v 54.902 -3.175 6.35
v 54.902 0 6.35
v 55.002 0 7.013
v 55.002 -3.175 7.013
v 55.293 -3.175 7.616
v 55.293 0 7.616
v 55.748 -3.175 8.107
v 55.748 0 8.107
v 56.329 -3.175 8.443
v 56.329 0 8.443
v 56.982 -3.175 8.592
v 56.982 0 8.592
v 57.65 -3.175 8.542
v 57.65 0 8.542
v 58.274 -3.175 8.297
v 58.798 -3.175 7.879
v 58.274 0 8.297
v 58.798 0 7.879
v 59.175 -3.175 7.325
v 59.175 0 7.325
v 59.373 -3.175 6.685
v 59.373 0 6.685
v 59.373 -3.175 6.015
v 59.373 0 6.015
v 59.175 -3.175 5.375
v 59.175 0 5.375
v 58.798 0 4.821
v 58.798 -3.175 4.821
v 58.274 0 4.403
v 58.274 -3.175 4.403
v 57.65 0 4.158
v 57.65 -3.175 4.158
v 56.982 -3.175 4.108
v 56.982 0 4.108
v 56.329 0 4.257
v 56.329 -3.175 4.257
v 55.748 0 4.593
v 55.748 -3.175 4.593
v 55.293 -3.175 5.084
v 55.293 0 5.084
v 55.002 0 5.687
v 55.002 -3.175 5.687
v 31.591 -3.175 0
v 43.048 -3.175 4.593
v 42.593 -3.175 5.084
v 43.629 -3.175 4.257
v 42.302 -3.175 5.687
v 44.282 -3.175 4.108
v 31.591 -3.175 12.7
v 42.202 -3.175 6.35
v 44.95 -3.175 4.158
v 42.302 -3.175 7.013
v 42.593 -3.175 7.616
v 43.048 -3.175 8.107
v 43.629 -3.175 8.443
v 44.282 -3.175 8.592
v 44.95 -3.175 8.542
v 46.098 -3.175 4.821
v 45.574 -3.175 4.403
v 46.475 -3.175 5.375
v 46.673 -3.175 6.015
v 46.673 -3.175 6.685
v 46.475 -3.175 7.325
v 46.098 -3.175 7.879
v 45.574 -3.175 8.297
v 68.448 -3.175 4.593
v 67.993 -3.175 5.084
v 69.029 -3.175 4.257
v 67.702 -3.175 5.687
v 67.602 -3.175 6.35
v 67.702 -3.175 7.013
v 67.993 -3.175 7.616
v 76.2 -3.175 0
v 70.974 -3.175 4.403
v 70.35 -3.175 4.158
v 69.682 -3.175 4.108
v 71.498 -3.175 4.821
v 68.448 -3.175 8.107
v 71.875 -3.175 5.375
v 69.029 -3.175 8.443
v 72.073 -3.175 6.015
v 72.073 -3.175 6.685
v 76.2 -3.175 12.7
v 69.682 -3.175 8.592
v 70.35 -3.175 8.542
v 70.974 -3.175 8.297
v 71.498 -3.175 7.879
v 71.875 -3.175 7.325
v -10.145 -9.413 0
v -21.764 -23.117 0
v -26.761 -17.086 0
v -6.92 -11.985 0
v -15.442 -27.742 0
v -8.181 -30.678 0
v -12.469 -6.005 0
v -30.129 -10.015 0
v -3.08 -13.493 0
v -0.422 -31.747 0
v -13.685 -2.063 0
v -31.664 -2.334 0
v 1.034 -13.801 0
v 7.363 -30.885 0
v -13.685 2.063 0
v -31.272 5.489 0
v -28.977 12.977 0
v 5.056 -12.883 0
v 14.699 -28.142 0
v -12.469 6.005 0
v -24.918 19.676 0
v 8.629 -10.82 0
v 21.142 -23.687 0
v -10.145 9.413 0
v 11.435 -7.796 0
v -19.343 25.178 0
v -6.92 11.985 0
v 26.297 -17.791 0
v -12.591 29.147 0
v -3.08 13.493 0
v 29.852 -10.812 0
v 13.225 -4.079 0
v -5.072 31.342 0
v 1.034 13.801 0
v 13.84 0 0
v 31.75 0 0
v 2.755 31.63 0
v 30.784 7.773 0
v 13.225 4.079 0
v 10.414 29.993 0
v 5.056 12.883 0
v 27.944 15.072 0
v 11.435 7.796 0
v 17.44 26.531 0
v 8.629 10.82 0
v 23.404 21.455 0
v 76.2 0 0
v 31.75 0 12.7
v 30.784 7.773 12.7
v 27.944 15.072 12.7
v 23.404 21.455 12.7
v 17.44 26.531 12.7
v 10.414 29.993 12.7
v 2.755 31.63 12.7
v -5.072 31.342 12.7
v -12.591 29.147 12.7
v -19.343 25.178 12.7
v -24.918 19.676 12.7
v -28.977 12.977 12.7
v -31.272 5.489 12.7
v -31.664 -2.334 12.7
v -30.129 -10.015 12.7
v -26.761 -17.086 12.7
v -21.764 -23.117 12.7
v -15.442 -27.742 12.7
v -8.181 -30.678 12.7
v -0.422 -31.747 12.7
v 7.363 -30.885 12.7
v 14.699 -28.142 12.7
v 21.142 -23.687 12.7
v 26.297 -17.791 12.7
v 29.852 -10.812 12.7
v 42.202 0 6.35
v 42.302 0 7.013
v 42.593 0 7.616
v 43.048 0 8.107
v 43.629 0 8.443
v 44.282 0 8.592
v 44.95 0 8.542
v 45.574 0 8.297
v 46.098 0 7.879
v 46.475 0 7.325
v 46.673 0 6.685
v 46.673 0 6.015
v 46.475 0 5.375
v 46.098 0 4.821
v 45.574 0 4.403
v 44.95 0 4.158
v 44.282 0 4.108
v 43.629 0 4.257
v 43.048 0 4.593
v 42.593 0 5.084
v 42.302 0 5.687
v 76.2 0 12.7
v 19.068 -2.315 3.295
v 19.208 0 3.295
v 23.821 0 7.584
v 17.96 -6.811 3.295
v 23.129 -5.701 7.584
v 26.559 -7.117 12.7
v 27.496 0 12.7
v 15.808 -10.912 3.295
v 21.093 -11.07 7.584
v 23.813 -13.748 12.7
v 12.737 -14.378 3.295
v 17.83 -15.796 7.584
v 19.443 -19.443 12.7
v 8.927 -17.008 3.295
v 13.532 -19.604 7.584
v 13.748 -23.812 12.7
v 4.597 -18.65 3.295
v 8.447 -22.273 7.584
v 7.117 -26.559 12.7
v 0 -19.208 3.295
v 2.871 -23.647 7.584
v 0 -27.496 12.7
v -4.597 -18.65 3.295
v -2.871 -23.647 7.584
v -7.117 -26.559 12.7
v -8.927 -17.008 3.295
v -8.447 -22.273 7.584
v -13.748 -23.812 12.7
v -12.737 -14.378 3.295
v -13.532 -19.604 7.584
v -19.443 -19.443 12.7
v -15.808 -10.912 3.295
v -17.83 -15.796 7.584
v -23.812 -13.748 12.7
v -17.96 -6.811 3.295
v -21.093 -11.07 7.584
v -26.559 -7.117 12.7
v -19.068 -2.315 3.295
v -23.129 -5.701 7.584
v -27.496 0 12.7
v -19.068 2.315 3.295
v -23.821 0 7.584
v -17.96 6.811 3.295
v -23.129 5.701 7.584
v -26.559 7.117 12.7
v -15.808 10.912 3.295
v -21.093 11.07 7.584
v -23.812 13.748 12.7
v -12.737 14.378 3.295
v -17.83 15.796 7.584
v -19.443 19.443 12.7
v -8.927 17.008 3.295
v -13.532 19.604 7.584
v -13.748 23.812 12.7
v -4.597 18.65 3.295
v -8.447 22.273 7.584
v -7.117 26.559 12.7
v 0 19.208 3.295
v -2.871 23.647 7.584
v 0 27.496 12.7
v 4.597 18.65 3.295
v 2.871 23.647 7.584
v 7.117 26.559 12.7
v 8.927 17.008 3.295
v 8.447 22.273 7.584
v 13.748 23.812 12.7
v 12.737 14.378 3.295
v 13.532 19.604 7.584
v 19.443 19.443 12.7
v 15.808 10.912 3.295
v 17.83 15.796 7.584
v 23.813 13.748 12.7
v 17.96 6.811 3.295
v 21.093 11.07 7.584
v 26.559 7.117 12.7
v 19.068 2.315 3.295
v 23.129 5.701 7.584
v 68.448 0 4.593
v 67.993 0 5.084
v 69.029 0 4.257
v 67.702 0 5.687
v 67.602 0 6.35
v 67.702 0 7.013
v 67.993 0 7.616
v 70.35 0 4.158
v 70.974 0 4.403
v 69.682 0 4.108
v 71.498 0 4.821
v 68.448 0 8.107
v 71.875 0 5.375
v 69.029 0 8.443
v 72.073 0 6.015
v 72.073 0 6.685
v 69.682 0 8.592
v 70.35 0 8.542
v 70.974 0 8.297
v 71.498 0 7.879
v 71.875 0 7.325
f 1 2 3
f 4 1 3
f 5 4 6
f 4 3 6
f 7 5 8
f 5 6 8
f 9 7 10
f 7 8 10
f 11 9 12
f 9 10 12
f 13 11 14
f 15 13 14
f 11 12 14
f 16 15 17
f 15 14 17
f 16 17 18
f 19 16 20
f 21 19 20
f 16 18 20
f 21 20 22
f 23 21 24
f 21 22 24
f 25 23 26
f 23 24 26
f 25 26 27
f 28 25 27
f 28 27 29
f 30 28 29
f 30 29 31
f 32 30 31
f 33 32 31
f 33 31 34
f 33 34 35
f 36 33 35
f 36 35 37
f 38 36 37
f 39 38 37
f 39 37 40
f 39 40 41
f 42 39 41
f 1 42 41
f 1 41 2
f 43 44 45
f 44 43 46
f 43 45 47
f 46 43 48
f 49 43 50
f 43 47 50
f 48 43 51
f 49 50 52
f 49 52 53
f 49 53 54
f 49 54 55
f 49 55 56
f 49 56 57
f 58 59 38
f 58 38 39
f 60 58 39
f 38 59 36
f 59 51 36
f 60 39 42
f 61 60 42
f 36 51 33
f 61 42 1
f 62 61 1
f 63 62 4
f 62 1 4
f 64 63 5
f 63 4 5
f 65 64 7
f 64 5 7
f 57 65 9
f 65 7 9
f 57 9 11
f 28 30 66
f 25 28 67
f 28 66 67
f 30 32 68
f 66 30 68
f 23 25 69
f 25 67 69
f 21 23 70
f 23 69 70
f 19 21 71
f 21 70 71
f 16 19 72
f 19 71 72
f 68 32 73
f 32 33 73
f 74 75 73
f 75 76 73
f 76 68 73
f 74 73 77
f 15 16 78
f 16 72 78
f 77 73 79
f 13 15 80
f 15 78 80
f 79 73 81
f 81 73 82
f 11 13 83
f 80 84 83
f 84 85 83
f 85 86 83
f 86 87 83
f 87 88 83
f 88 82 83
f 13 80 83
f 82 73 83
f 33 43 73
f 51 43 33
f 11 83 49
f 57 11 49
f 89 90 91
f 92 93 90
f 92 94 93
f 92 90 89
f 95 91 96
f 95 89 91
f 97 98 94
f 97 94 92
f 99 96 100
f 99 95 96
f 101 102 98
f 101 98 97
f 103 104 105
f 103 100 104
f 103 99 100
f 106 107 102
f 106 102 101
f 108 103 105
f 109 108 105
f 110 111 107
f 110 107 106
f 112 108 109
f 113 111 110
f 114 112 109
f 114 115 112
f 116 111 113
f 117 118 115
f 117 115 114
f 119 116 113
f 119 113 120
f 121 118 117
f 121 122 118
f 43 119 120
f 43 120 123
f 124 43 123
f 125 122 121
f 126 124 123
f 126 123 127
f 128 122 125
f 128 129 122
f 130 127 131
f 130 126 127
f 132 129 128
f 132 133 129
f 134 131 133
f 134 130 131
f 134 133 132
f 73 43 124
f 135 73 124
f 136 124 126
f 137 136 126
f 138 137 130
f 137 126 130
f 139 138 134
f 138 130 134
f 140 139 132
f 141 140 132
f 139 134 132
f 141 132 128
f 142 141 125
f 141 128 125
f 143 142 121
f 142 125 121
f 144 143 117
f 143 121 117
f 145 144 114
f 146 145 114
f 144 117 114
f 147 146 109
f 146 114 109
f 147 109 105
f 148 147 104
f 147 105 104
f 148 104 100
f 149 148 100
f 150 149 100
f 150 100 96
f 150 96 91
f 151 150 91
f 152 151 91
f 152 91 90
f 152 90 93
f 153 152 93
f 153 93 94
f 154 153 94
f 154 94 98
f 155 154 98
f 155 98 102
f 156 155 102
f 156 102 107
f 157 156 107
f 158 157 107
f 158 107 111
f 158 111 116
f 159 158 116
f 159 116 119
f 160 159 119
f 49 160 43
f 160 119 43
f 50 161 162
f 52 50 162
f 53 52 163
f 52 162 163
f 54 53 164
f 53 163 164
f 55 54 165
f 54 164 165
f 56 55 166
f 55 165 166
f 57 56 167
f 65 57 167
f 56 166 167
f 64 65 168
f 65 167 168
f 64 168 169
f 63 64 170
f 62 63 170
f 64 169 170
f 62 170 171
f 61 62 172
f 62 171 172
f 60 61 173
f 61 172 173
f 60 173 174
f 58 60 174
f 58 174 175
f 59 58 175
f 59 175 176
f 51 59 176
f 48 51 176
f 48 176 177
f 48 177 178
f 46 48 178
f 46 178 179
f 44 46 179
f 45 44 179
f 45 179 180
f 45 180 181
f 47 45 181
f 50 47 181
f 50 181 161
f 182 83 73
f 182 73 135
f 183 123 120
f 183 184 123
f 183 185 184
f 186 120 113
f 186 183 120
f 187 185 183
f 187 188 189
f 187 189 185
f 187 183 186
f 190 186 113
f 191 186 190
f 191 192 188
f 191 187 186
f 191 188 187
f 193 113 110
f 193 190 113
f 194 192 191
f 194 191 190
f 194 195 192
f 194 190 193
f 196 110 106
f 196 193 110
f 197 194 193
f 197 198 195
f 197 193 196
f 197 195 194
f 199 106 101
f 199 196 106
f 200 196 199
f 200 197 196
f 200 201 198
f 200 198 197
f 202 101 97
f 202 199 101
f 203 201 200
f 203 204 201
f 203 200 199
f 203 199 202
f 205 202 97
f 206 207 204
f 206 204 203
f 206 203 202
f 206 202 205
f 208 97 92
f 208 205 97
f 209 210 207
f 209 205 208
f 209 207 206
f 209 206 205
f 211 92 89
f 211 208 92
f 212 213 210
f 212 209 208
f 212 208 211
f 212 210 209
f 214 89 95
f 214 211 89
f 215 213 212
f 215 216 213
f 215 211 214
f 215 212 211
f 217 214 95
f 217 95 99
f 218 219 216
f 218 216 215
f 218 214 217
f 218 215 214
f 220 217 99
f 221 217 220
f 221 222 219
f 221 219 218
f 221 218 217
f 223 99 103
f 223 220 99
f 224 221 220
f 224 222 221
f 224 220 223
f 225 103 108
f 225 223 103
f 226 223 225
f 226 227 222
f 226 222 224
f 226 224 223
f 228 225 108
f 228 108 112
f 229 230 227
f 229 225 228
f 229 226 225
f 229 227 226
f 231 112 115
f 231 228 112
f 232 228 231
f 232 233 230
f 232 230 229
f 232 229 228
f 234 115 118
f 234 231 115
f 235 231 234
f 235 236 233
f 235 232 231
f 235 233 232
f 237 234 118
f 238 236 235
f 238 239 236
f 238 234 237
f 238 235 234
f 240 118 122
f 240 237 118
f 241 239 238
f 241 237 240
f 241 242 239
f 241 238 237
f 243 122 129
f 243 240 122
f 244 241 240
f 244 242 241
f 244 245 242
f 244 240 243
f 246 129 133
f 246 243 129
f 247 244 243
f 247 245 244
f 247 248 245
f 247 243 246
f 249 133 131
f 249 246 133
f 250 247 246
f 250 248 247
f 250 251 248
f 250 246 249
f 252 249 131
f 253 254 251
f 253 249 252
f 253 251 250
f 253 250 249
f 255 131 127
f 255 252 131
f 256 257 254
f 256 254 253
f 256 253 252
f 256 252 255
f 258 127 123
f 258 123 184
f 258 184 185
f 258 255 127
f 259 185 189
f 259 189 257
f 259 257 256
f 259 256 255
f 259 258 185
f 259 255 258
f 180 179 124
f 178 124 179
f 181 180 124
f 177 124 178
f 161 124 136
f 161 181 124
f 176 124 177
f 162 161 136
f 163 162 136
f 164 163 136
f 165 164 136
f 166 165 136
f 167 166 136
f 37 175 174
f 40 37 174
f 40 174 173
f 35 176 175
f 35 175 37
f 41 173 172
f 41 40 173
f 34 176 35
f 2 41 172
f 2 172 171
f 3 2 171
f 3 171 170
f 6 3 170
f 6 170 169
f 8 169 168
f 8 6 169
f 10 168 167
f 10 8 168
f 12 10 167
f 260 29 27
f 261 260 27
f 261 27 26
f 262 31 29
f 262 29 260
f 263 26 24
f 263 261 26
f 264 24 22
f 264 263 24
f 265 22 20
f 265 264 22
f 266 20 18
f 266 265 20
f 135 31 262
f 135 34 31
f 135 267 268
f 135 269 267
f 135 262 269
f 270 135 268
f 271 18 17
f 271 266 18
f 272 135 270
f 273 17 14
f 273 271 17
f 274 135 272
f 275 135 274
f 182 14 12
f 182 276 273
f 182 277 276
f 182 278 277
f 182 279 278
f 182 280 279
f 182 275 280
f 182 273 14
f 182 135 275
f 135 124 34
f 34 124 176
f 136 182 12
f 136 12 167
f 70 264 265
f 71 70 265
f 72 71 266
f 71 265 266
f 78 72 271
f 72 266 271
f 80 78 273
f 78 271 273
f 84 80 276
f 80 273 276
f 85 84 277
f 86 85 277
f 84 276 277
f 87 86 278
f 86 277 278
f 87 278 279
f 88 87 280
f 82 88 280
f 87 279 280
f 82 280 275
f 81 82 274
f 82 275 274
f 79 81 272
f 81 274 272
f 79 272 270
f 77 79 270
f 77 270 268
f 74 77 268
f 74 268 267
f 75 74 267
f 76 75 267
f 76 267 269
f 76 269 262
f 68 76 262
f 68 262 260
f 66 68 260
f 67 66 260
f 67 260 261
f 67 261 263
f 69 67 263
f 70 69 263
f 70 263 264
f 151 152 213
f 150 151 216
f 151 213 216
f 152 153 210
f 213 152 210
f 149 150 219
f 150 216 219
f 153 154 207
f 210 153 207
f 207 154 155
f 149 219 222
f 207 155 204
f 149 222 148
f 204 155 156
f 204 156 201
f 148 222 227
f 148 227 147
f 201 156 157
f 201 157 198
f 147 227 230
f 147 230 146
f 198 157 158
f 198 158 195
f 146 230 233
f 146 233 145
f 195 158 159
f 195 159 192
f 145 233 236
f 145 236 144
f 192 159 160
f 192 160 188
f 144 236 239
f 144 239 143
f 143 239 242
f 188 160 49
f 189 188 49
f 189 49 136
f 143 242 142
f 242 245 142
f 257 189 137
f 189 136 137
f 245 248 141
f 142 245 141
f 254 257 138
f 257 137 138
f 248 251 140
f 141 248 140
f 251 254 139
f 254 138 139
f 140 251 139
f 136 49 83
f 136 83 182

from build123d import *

# Parameters (mm, degrees)
F0_R     = 31.75
F1_DEPTH = 12.7
F5_W     = 3.175
F5_H     = 12.7
F8_D     = 4.4958


with BuildPart() as f1:
    # F0 (on Top) → F1 (new body)
    with BuildSketch(Plane.XY):
        Circle(F0_R)
    extrude(amount=F1_DEPTH)

    # F2 (on Front) → F3 (revolve, cut)
    with BuildSketch(Plane.XZ):
        with BuildLine():
            ThreePointArc((0, -3.175), (22.4506403027, 6.1243596973), (31.75, 28.575))
            ThreePointArc((31.75, 28.575), (22.4506403027, 51.0256403027), (0, 60.325))
            Line((0, 60.325), (0, -3.175))
        make_face()
    revolve(axis=Axis((0, 0, 28.575), (0, 0, -1)), mode=Mode.SUBTRACT)

    # F5 (on offset) → F6 (join, up to the next surface of F1)
    with BuildSketch(Plane.YZ.offset(76.2)):
        with Locations((-1.5875, 6.35)):
            Rectangle(F5_W, F5_H)
    extrude(until=Until.NEXT, dir=(-1, 0, 0))

    # F8 (through all)
    with Locations(Plane.XZ.offset(3.175)):
        with Locations((44.45, 6.35), (69.85, 6.35), (57.15, 6.35)):
            Hole(F8_D / 2)


solid = f1.part
